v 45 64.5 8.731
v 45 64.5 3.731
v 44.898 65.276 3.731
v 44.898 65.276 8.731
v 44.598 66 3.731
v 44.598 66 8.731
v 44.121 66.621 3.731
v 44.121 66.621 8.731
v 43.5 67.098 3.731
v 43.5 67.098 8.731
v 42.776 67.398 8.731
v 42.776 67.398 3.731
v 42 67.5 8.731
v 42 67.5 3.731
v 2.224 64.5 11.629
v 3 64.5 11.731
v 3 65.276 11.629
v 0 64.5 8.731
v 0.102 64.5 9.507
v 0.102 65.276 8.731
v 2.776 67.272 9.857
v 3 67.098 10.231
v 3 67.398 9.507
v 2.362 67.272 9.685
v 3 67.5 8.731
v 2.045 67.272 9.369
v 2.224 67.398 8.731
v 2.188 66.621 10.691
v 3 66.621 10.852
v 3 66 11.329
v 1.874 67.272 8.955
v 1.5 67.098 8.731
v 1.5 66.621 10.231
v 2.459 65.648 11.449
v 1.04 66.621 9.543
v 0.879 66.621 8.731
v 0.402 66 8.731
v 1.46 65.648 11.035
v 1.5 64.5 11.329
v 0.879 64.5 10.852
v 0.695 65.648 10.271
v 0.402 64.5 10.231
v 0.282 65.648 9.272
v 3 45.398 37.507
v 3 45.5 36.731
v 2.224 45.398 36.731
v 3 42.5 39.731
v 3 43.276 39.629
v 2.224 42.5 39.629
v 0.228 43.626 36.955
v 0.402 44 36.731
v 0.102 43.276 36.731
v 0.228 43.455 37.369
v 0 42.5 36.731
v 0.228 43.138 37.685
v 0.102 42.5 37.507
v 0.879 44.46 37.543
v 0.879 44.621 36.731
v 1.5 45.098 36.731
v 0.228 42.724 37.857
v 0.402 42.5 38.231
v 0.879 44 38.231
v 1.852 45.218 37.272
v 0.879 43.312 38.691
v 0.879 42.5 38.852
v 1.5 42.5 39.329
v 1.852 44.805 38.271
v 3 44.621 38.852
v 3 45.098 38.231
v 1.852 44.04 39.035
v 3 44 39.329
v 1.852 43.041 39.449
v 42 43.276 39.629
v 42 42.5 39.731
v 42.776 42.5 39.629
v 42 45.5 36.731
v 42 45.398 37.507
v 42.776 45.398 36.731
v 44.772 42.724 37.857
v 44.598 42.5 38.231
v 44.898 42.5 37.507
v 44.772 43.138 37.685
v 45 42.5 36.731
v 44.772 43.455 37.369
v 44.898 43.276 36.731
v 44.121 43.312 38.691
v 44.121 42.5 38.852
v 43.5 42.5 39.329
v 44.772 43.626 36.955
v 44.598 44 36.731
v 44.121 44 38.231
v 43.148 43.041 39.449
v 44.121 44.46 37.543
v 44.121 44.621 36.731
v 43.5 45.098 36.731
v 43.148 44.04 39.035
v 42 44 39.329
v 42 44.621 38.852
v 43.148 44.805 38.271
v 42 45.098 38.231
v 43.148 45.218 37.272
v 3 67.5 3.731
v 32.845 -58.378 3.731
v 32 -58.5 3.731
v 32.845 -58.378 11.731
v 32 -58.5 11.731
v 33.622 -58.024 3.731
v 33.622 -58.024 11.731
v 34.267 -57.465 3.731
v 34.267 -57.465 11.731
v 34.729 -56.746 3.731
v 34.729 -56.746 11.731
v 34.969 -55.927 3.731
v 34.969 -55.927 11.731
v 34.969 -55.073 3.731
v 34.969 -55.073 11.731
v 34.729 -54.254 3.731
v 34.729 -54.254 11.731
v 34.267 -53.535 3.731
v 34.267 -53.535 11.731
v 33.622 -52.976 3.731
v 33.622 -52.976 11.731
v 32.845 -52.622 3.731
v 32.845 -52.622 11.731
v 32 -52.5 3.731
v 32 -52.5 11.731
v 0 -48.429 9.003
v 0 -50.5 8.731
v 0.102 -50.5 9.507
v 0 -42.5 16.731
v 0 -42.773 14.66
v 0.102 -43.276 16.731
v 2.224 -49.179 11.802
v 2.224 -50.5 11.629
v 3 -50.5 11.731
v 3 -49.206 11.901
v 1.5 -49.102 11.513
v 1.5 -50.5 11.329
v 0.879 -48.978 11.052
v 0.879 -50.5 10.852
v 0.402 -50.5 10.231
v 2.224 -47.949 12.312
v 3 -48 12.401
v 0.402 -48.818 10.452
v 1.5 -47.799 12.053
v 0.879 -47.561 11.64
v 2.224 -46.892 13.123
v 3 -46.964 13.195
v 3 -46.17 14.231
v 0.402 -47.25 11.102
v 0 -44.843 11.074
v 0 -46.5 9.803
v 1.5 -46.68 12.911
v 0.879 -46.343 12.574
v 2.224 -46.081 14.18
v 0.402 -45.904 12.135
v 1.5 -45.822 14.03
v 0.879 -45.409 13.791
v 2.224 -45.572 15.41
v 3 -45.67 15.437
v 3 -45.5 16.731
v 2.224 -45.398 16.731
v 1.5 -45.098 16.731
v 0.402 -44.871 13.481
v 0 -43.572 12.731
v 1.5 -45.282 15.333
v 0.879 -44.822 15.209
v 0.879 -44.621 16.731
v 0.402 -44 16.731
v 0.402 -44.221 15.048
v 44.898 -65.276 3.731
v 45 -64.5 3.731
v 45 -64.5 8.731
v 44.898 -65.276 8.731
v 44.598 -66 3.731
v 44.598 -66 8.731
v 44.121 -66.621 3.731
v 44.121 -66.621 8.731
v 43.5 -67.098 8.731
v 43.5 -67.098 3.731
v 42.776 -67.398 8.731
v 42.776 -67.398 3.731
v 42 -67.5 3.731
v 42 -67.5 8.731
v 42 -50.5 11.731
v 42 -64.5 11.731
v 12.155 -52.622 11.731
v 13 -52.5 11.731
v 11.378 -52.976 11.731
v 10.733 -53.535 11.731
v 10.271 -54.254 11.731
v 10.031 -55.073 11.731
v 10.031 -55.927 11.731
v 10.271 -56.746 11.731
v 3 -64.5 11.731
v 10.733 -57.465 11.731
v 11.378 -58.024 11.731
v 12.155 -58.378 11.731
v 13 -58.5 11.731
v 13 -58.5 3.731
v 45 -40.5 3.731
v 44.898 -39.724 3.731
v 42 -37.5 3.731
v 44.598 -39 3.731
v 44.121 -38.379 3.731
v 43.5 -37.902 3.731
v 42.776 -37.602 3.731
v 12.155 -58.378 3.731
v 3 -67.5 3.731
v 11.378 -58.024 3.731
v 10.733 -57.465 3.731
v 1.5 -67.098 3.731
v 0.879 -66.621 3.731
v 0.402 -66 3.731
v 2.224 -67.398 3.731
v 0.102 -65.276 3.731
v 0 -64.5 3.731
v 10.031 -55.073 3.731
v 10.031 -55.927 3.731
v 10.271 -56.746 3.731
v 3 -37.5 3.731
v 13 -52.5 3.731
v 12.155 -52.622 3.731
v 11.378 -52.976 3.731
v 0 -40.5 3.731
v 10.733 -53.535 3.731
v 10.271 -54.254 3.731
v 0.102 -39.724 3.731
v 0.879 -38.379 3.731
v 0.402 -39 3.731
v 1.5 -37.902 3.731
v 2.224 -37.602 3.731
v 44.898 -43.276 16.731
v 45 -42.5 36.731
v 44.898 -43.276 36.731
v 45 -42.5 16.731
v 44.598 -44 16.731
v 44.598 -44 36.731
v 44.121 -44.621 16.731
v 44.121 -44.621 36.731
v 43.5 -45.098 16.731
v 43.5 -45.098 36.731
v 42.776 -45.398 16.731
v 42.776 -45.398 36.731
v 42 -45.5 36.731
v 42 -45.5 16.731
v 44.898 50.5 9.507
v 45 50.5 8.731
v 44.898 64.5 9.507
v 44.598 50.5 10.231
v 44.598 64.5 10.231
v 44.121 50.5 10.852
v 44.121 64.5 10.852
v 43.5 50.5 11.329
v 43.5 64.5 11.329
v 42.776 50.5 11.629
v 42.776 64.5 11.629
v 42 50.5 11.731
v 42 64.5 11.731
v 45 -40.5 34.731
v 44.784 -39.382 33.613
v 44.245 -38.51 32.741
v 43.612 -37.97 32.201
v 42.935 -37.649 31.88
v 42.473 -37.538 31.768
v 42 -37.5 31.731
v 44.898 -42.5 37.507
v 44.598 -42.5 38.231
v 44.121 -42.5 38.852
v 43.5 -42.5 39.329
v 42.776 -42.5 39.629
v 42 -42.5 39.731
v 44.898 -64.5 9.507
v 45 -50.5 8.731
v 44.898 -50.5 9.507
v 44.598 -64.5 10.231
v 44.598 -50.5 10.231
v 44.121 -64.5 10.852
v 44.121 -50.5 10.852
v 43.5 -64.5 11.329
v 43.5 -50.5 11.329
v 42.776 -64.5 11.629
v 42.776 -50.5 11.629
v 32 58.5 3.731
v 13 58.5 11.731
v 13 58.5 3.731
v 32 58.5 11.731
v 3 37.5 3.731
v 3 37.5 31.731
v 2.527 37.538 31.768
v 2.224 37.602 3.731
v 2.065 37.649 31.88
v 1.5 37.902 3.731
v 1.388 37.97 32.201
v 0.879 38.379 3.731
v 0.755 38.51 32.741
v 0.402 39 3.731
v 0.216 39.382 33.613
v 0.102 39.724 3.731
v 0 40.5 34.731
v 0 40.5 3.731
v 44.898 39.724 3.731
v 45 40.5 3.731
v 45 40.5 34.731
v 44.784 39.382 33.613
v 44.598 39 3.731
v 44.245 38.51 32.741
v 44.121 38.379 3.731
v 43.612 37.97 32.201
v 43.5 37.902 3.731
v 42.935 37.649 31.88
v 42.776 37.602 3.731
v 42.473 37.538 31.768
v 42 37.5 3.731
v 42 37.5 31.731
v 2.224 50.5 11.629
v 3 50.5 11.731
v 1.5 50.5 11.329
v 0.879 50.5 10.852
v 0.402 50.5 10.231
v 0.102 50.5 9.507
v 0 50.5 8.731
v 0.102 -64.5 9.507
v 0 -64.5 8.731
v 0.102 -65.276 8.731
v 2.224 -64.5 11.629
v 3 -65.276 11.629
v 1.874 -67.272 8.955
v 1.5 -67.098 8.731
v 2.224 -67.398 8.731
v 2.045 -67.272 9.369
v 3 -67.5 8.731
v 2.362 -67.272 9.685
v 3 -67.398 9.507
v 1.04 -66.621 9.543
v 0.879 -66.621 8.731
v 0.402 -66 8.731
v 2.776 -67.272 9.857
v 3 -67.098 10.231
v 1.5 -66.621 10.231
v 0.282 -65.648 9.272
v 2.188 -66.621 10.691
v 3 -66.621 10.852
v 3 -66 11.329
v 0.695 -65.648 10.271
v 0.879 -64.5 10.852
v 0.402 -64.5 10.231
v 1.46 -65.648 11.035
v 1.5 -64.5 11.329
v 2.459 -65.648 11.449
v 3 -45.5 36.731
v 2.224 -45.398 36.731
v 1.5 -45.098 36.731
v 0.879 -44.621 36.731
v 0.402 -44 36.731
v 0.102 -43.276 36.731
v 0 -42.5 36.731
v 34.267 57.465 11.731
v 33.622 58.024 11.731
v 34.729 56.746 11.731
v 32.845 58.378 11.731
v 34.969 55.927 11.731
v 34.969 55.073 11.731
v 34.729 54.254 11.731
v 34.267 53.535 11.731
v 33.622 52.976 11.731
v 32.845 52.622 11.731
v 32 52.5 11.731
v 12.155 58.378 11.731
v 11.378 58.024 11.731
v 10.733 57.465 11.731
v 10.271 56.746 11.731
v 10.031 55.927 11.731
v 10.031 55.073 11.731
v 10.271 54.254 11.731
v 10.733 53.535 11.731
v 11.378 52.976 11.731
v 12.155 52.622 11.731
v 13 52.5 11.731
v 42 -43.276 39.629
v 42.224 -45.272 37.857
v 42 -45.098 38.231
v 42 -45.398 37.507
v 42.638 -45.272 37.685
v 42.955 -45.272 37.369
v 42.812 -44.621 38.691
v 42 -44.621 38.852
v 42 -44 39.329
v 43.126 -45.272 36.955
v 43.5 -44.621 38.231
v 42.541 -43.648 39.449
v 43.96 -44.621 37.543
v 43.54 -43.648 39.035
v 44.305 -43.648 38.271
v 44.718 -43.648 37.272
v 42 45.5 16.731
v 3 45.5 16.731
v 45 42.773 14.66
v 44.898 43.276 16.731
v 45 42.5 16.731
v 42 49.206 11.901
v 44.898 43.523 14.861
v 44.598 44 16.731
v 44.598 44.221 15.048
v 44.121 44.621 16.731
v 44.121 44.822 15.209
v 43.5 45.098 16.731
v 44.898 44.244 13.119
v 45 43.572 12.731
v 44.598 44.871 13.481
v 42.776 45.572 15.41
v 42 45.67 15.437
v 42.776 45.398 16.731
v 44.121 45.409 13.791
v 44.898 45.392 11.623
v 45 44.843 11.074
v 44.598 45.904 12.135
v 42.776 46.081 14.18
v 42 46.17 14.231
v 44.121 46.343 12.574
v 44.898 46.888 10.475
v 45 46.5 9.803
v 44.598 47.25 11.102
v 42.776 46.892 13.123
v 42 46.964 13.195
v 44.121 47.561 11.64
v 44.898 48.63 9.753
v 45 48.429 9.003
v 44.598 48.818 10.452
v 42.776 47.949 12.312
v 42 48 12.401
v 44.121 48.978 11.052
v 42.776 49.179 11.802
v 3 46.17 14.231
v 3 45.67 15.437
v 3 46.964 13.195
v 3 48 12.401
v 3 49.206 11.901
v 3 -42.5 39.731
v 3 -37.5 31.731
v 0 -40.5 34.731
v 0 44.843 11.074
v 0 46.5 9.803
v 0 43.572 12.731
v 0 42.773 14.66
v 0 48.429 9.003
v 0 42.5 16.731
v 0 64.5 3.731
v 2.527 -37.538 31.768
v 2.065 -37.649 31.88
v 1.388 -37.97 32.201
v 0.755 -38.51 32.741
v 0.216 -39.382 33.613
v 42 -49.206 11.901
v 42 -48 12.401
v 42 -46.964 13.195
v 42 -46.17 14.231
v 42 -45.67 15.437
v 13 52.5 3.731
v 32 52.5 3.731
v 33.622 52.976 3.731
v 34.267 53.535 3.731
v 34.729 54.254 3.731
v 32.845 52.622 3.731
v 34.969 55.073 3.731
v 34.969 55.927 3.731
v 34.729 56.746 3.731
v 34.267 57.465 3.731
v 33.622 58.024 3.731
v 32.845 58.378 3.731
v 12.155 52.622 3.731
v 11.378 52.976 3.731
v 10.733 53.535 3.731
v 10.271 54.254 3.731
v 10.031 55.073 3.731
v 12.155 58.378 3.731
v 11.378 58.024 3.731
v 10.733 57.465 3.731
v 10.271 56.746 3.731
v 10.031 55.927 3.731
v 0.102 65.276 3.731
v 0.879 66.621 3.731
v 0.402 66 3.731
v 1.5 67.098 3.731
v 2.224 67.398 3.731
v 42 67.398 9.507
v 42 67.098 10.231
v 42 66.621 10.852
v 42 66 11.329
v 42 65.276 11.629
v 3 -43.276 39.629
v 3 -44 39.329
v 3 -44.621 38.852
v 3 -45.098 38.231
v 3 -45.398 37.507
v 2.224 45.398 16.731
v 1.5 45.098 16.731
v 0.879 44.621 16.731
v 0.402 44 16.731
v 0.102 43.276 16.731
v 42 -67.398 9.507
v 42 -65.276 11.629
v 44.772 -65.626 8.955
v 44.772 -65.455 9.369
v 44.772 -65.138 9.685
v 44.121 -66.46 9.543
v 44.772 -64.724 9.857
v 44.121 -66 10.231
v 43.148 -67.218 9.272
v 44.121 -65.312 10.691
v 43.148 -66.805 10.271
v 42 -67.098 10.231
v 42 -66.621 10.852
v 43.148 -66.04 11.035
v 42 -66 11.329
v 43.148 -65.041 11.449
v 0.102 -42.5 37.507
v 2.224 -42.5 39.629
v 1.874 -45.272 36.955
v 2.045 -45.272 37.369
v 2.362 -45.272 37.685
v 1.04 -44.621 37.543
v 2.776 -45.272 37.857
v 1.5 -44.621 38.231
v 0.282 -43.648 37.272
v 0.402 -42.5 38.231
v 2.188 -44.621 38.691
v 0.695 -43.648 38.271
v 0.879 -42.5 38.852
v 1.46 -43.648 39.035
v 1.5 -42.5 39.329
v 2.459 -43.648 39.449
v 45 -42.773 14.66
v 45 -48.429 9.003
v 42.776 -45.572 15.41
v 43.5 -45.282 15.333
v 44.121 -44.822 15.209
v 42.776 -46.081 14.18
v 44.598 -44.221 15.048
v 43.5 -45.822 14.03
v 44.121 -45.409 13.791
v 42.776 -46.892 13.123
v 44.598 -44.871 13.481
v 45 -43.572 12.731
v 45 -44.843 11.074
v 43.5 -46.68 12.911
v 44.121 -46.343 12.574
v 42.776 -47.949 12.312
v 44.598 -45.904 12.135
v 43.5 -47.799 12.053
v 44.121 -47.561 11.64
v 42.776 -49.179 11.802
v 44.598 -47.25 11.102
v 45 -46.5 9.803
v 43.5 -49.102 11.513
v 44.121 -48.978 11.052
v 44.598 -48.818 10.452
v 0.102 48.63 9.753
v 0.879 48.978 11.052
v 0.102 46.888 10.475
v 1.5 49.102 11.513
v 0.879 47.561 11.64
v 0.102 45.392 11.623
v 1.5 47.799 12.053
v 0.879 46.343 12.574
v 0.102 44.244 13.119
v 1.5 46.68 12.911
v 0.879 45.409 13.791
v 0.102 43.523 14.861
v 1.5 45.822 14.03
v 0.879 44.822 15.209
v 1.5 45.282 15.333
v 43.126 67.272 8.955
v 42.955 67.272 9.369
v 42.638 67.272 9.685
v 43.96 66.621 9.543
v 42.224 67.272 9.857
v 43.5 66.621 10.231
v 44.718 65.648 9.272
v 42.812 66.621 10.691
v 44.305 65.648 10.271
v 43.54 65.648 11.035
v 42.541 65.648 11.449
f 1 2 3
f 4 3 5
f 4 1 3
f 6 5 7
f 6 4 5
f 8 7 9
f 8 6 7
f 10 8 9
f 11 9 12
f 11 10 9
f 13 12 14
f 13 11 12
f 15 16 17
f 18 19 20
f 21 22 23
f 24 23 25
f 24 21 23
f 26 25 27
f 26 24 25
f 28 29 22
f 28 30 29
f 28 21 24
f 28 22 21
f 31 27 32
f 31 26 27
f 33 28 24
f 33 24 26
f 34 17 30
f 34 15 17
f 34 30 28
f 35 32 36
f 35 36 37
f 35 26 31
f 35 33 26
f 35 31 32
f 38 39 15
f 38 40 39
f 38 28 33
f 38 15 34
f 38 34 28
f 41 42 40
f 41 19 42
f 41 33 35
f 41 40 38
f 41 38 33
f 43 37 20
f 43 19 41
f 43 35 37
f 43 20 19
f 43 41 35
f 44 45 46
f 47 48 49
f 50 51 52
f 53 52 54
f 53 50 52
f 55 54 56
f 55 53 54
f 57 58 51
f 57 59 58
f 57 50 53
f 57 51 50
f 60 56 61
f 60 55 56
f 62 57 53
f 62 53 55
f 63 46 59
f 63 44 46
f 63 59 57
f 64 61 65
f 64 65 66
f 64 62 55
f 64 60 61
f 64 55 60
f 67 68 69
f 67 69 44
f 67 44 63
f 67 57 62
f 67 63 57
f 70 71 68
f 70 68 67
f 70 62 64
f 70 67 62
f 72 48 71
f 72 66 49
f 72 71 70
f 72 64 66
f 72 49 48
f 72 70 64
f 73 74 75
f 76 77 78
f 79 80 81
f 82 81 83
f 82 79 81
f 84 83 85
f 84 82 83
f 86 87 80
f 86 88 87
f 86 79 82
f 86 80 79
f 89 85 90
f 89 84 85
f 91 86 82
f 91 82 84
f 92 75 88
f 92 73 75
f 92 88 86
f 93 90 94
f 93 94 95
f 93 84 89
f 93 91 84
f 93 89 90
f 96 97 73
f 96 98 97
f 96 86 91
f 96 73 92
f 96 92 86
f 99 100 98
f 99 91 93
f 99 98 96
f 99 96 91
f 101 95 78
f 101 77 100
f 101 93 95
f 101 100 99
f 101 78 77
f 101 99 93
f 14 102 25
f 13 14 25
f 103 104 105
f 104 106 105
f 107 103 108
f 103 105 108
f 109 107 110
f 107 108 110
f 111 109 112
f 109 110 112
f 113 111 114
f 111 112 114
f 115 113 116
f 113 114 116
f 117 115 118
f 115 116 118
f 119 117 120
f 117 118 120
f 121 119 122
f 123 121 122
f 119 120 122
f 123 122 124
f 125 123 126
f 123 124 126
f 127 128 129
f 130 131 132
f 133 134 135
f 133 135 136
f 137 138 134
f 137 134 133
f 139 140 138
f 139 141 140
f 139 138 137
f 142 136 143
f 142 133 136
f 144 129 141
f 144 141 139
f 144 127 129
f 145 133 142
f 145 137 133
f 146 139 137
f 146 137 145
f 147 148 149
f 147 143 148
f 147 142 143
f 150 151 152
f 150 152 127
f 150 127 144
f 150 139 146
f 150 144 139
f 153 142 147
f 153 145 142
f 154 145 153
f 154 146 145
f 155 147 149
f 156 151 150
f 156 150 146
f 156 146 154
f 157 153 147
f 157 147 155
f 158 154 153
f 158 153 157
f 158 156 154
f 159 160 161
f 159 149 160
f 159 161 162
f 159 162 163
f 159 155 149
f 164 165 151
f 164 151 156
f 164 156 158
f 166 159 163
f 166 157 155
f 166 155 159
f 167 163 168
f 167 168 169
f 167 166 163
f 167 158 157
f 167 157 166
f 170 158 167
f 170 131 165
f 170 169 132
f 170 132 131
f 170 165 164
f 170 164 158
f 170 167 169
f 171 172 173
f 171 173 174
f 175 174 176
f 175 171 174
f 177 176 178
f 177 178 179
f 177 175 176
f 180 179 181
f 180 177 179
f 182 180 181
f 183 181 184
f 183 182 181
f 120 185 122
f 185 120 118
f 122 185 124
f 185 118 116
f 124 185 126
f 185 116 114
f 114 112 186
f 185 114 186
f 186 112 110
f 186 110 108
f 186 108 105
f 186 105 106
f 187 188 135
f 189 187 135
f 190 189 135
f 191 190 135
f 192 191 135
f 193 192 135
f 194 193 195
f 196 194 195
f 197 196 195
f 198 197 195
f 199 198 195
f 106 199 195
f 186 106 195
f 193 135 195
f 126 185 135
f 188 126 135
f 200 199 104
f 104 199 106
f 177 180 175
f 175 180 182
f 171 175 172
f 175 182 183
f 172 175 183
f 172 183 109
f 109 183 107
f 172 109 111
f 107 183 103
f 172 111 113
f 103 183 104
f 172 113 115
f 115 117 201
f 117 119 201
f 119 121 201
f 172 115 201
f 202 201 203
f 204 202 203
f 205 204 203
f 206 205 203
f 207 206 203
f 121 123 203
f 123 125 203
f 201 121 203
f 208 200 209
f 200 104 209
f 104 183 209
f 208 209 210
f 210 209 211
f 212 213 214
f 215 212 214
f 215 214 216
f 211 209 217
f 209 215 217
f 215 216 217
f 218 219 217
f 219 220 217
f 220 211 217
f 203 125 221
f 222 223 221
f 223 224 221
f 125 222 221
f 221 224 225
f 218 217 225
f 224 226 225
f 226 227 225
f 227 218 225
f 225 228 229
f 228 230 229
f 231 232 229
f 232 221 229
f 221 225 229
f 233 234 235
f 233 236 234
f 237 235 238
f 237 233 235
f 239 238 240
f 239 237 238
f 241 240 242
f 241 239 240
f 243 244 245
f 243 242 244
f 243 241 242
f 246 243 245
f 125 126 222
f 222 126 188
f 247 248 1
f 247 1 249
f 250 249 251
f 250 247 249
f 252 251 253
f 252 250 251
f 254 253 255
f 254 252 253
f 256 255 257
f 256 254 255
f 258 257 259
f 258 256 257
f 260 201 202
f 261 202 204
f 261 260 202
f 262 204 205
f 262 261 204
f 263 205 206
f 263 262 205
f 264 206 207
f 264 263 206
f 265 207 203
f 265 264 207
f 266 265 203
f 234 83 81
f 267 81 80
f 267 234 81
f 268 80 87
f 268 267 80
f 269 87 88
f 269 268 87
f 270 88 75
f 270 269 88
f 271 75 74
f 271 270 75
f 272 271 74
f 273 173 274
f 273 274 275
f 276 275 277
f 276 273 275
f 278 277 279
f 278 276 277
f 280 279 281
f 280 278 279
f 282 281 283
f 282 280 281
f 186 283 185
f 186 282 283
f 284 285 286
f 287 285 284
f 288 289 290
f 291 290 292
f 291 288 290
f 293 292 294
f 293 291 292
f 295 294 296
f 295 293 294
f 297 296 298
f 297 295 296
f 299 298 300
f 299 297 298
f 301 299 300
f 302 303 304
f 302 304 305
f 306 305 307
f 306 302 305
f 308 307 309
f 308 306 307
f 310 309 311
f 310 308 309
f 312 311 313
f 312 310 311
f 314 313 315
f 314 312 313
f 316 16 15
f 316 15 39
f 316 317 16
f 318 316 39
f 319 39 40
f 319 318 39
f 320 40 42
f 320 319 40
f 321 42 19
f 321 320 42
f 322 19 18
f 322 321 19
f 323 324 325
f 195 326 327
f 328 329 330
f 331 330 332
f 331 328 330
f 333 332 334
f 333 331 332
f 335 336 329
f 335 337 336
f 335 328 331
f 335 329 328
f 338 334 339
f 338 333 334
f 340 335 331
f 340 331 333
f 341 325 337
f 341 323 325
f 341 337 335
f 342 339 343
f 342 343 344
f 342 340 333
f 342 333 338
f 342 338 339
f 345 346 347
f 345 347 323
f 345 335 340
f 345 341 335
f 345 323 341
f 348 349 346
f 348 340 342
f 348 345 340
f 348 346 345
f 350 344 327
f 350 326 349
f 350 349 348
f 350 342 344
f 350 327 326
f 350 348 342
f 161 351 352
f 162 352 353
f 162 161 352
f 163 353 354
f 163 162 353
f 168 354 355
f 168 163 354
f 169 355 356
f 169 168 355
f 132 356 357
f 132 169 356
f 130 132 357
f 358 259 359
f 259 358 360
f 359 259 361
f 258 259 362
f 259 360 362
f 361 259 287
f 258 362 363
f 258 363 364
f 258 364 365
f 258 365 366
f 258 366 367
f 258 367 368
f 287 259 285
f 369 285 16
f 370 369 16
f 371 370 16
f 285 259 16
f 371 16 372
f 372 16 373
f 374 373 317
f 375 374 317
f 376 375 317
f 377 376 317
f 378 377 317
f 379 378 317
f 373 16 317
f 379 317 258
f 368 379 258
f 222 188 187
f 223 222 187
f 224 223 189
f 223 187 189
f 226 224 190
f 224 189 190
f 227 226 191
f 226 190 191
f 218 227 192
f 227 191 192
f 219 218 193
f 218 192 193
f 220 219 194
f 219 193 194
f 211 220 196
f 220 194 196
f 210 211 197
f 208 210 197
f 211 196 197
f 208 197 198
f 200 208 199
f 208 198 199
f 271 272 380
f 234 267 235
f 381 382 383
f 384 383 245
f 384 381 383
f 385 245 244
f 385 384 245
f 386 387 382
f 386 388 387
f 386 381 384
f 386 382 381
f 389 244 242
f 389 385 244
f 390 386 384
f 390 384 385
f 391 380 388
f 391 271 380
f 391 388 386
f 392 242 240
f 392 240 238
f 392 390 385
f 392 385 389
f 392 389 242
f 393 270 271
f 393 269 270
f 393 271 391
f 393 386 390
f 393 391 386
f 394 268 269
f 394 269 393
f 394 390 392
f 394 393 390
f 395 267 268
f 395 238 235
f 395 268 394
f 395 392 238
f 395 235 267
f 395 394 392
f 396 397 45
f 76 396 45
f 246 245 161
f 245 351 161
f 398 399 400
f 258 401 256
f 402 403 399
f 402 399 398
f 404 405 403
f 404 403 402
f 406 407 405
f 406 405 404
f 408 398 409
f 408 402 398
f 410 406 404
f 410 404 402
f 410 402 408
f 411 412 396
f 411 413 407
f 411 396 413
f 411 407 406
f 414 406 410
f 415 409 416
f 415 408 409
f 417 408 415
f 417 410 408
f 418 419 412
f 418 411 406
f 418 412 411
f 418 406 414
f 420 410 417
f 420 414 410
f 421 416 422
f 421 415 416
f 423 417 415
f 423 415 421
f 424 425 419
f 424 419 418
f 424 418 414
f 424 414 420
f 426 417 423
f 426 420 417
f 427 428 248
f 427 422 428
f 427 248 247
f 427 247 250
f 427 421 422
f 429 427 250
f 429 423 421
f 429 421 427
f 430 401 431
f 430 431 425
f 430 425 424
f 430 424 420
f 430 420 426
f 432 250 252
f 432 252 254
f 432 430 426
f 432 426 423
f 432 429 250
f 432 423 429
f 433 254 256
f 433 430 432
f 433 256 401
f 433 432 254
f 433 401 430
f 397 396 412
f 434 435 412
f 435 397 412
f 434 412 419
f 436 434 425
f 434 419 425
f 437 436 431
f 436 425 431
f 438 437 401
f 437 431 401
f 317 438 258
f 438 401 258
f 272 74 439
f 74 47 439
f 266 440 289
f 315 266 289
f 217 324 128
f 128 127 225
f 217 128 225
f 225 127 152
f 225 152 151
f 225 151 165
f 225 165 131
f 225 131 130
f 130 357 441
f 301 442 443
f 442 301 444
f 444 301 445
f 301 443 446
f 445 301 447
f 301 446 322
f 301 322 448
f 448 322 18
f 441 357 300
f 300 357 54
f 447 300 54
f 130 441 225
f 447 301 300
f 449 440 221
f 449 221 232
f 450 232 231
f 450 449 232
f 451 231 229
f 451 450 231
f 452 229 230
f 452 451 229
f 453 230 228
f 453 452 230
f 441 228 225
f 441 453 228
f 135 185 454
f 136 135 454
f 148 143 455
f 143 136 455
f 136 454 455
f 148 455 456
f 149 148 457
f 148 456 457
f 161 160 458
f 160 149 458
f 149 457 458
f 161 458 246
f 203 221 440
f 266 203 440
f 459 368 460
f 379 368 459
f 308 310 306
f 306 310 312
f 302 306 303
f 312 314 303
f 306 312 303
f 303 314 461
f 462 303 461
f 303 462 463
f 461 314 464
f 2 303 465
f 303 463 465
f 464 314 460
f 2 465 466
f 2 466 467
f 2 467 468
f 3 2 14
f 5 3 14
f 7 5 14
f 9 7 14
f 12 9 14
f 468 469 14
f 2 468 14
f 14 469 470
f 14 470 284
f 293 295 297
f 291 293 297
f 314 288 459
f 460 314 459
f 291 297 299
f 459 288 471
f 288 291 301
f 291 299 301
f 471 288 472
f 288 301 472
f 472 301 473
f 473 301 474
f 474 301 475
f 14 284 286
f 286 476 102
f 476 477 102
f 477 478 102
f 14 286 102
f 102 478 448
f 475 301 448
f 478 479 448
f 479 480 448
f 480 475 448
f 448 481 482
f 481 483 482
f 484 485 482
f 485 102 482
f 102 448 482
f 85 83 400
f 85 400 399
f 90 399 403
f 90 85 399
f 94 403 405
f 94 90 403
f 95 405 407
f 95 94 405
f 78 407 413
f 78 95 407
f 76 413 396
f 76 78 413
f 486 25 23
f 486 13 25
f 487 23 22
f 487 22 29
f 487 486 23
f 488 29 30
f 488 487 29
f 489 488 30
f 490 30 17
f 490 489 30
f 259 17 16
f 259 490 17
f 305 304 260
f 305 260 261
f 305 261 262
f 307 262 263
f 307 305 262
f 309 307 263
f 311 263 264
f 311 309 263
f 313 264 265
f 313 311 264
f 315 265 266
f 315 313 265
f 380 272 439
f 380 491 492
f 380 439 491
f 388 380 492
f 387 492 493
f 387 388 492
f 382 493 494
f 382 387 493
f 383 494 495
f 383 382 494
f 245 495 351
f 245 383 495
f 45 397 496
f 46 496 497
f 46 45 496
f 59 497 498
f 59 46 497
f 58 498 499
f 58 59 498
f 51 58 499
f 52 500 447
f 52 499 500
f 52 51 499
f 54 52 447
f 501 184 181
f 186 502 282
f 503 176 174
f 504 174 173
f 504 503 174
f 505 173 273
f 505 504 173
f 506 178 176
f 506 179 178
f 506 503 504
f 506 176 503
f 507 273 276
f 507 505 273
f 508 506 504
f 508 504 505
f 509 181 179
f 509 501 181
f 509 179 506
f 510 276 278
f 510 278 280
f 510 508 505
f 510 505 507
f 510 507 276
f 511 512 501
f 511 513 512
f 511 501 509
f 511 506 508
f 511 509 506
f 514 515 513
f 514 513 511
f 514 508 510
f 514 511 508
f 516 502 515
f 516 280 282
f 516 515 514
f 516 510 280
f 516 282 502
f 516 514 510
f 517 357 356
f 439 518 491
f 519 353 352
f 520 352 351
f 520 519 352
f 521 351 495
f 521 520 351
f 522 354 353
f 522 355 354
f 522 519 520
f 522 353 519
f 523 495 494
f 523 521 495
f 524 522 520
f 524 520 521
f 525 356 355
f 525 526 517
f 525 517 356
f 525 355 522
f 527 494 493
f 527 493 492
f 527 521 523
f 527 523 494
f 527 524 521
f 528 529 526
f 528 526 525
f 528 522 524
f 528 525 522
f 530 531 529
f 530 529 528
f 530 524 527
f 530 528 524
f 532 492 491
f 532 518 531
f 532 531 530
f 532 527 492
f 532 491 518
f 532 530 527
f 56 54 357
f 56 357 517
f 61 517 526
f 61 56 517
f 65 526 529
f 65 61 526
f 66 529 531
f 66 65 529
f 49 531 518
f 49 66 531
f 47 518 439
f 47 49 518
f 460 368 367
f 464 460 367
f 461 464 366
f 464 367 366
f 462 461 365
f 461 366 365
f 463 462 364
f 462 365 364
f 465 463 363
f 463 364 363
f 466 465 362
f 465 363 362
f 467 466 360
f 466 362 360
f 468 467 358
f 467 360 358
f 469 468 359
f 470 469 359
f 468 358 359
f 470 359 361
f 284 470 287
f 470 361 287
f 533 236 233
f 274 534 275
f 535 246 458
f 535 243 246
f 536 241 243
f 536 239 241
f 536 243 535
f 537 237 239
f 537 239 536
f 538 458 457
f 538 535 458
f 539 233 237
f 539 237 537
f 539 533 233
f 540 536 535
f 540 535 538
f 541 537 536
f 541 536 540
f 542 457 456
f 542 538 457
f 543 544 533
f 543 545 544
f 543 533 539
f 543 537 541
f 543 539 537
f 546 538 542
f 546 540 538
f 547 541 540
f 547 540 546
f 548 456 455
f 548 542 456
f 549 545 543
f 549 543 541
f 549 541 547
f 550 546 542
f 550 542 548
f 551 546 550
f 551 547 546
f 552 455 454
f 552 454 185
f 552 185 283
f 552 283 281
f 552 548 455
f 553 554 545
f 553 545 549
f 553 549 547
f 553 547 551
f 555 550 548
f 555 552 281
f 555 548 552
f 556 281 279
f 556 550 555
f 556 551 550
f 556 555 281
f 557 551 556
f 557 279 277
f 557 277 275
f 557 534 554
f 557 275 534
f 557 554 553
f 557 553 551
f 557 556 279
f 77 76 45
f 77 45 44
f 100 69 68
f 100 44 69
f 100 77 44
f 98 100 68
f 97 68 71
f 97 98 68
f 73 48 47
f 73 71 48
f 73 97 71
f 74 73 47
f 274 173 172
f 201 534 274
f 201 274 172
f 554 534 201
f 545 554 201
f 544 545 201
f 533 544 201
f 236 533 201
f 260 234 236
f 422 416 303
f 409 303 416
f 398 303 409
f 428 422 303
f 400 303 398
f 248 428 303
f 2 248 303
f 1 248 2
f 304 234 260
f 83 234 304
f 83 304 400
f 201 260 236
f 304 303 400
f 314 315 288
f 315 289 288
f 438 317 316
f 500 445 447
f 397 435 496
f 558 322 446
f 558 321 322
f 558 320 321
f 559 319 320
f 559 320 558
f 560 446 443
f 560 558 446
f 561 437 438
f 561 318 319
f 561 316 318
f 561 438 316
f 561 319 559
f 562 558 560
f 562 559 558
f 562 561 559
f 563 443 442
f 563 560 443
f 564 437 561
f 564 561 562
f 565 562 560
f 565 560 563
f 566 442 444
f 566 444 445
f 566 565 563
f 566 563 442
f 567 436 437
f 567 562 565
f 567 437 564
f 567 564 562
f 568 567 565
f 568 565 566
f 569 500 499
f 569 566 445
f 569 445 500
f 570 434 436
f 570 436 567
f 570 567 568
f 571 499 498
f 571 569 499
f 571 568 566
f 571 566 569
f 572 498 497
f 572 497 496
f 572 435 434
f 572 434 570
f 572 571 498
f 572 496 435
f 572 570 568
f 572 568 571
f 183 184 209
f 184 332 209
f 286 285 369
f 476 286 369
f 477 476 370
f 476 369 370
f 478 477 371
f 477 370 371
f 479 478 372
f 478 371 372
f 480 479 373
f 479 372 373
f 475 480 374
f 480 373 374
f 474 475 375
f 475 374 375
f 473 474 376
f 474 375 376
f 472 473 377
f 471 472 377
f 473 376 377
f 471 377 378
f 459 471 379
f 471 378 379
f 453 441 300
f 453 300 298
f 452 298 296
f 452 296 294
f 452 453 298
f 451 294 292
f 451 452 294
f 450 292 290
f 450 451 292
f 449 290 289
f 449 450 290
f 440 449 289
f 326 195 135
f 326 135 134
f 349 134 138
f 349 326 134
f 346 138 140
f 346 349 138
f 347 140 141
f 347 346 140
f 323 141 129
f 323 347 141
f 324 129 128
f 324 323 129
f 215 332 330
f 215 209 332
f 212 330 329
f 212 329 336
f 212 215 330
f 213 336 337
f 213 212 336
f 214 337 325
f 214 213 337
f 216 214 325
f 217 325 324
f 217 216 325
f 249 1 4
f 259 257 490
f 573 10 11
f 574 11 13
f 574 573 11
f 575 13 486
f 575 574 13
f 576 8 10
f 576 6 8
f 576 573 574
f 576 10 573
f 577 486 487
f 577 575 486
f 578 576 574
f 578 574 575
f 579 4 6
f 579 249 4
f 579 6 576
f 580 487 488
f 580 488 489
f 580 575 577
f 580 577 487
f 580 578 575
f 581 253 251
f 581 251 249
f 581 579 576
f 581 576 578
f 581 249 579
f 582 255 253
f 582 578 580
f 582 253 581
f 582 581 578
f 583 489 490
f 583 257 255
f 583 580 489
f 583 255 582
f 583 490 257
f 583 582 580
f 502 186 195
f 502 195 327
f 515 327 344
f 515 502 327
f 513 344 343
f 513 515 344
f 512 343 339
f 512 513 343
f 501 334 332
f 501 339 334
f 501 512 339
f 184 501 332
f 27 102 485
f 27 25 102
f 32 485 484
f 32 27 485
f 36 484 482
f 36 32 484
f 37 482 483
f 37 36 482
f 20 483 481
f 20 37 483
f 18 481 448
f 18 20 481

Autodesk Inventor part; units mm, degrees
ref_plane "YZ Plane" through (0, 0, 0) normal (1, 0, 0) x (0, 1, 0)
ref_plane "XZ Plane" through (0, 0, 0) normal (0, 1, 0) x (-1, 0, 0)
ref_plane "XY Plane" through (0, 0, 0) normal (0, 0, 1) x (1, 0, 0)
sketch "Sketch1" plane through (0, 0, 0) normal (1, 0, 0) x (0, 1, 0)
  line L0 (-67.5, 3.7308) -> (-37.5, 3.7308)
  line L1 (-37.5, 3.7308) -> (-37.5, 31.7308)
  line L2 (-37.5, 31.7308) -> (37.5, 31.7308)
  line L3 (37.5, 31.7308) -> (37.5, 3.7308)
  line L4 (37.5, 3.7308) -> (67.5, 3.7308)
  line L5 (67.5, 3.7308) -> (67.5, 11.7308)
  line L6 (67.5, 11.7308) -> (45.5, 11.7308)
  line L7 (45.5, 11.7308) -> (45.5, 39.7308)
  line L8 (45.5, 39.7308) -> (-45.5, 39.7308)
  line L9 (-45.5, 39.7308) -> (-45.5, 11.7308)
  line L10 (-45.5, 11.7308) -> (-67.5, 11.7308)
  line L11 (-67.5, 11.7308) -> (-67.5, 3.7308)
  line L12 (0, 0) -> (0, 98)
  dimension "d0" = 75
  dimension "d1" = 30
  dimension "d2" = 8
  dimension "d3" = 8
  dimension "d4" = 8
  dimension "d5" = 8
  dimension "d6" = 28
extrude "Extrusion1" add sketch "Sketch1" along normal blind 45
sketch "Sketch2" plane through (0, 45.5, 11.7308) normal (0, 0, 1) x (1, 0, 0)
  line L0 (0, -45.5) -> (80, -45.5)
  line L1 (0, 22) -> (0, 0) projected
  line L2 (0, 0) -> (45, 0) projected
  line L3 (45, 22) -> (45, 0) projected
  line L4 (0, 22) -> (45, 22) projected
  line L5 (32, 10) -> (13, 10) construction
  line L6 (32, 7) -> (13, 7)
  line L7 (13, 13) -> (32, 13)
  arc A0 (32, 7) -> (32, 13) centre (32, 10) ccw
  arc A1 (13, 13) -> (13, 7) centre (13, 10) ccw
  line L8 (32, -98) -> (13, -98)
  line L9 (13, -104) -> (32, -104)
  arc A2 (32, -104) -> (32, -98) centre (32, -101) ccw
  arc A3 (13, -98) -> (13, -104) centre (13, -101) ccw
  point P0 (22.5, 10)
extrude "Extrusion2" cut sketch "Sketch2" against normal through all contours L6 A1 L7 A0 | A2 L9 A3 L8
fillet "Fillet1" radius 5 2 edges at (22.5, 45.5, 11.7308) (22.5, -45.5, 11.7308)
fillet "Fillet2" radius 3 24 edges at (22.5, 45.5, 39.7308) (0, 0, 39.7308) (0, 37.5, 17.7308) (0, 0, 31.7308) (0, -37.5, 17.7308) (0, -59, 11.7308) (0, -45.5, 28.2308) (45, 0, 39.7308) (45, 59, 11.7308) (45, 45.5, 28.2308) (0, 59, 11.7308) (0, 45.5, 28.2308) (22.5, 67.5, 11.7308) (45, 67.5, 7.7308) (0, 67.5, 7.7308) (22.5, -45.5, 39.7308) (22.5, -67.5, 11.7308) (0, -67.5, 7.7308) (45, -67.5, 7.7308) (45, -59, 11.7308) (45, -45.5, 28.2308) (45, -37.5, 17.7308) (45, 0, 31.7308) (45, 37.5, 17.7308)
properties part number "sujeta-taladro-0,1"
